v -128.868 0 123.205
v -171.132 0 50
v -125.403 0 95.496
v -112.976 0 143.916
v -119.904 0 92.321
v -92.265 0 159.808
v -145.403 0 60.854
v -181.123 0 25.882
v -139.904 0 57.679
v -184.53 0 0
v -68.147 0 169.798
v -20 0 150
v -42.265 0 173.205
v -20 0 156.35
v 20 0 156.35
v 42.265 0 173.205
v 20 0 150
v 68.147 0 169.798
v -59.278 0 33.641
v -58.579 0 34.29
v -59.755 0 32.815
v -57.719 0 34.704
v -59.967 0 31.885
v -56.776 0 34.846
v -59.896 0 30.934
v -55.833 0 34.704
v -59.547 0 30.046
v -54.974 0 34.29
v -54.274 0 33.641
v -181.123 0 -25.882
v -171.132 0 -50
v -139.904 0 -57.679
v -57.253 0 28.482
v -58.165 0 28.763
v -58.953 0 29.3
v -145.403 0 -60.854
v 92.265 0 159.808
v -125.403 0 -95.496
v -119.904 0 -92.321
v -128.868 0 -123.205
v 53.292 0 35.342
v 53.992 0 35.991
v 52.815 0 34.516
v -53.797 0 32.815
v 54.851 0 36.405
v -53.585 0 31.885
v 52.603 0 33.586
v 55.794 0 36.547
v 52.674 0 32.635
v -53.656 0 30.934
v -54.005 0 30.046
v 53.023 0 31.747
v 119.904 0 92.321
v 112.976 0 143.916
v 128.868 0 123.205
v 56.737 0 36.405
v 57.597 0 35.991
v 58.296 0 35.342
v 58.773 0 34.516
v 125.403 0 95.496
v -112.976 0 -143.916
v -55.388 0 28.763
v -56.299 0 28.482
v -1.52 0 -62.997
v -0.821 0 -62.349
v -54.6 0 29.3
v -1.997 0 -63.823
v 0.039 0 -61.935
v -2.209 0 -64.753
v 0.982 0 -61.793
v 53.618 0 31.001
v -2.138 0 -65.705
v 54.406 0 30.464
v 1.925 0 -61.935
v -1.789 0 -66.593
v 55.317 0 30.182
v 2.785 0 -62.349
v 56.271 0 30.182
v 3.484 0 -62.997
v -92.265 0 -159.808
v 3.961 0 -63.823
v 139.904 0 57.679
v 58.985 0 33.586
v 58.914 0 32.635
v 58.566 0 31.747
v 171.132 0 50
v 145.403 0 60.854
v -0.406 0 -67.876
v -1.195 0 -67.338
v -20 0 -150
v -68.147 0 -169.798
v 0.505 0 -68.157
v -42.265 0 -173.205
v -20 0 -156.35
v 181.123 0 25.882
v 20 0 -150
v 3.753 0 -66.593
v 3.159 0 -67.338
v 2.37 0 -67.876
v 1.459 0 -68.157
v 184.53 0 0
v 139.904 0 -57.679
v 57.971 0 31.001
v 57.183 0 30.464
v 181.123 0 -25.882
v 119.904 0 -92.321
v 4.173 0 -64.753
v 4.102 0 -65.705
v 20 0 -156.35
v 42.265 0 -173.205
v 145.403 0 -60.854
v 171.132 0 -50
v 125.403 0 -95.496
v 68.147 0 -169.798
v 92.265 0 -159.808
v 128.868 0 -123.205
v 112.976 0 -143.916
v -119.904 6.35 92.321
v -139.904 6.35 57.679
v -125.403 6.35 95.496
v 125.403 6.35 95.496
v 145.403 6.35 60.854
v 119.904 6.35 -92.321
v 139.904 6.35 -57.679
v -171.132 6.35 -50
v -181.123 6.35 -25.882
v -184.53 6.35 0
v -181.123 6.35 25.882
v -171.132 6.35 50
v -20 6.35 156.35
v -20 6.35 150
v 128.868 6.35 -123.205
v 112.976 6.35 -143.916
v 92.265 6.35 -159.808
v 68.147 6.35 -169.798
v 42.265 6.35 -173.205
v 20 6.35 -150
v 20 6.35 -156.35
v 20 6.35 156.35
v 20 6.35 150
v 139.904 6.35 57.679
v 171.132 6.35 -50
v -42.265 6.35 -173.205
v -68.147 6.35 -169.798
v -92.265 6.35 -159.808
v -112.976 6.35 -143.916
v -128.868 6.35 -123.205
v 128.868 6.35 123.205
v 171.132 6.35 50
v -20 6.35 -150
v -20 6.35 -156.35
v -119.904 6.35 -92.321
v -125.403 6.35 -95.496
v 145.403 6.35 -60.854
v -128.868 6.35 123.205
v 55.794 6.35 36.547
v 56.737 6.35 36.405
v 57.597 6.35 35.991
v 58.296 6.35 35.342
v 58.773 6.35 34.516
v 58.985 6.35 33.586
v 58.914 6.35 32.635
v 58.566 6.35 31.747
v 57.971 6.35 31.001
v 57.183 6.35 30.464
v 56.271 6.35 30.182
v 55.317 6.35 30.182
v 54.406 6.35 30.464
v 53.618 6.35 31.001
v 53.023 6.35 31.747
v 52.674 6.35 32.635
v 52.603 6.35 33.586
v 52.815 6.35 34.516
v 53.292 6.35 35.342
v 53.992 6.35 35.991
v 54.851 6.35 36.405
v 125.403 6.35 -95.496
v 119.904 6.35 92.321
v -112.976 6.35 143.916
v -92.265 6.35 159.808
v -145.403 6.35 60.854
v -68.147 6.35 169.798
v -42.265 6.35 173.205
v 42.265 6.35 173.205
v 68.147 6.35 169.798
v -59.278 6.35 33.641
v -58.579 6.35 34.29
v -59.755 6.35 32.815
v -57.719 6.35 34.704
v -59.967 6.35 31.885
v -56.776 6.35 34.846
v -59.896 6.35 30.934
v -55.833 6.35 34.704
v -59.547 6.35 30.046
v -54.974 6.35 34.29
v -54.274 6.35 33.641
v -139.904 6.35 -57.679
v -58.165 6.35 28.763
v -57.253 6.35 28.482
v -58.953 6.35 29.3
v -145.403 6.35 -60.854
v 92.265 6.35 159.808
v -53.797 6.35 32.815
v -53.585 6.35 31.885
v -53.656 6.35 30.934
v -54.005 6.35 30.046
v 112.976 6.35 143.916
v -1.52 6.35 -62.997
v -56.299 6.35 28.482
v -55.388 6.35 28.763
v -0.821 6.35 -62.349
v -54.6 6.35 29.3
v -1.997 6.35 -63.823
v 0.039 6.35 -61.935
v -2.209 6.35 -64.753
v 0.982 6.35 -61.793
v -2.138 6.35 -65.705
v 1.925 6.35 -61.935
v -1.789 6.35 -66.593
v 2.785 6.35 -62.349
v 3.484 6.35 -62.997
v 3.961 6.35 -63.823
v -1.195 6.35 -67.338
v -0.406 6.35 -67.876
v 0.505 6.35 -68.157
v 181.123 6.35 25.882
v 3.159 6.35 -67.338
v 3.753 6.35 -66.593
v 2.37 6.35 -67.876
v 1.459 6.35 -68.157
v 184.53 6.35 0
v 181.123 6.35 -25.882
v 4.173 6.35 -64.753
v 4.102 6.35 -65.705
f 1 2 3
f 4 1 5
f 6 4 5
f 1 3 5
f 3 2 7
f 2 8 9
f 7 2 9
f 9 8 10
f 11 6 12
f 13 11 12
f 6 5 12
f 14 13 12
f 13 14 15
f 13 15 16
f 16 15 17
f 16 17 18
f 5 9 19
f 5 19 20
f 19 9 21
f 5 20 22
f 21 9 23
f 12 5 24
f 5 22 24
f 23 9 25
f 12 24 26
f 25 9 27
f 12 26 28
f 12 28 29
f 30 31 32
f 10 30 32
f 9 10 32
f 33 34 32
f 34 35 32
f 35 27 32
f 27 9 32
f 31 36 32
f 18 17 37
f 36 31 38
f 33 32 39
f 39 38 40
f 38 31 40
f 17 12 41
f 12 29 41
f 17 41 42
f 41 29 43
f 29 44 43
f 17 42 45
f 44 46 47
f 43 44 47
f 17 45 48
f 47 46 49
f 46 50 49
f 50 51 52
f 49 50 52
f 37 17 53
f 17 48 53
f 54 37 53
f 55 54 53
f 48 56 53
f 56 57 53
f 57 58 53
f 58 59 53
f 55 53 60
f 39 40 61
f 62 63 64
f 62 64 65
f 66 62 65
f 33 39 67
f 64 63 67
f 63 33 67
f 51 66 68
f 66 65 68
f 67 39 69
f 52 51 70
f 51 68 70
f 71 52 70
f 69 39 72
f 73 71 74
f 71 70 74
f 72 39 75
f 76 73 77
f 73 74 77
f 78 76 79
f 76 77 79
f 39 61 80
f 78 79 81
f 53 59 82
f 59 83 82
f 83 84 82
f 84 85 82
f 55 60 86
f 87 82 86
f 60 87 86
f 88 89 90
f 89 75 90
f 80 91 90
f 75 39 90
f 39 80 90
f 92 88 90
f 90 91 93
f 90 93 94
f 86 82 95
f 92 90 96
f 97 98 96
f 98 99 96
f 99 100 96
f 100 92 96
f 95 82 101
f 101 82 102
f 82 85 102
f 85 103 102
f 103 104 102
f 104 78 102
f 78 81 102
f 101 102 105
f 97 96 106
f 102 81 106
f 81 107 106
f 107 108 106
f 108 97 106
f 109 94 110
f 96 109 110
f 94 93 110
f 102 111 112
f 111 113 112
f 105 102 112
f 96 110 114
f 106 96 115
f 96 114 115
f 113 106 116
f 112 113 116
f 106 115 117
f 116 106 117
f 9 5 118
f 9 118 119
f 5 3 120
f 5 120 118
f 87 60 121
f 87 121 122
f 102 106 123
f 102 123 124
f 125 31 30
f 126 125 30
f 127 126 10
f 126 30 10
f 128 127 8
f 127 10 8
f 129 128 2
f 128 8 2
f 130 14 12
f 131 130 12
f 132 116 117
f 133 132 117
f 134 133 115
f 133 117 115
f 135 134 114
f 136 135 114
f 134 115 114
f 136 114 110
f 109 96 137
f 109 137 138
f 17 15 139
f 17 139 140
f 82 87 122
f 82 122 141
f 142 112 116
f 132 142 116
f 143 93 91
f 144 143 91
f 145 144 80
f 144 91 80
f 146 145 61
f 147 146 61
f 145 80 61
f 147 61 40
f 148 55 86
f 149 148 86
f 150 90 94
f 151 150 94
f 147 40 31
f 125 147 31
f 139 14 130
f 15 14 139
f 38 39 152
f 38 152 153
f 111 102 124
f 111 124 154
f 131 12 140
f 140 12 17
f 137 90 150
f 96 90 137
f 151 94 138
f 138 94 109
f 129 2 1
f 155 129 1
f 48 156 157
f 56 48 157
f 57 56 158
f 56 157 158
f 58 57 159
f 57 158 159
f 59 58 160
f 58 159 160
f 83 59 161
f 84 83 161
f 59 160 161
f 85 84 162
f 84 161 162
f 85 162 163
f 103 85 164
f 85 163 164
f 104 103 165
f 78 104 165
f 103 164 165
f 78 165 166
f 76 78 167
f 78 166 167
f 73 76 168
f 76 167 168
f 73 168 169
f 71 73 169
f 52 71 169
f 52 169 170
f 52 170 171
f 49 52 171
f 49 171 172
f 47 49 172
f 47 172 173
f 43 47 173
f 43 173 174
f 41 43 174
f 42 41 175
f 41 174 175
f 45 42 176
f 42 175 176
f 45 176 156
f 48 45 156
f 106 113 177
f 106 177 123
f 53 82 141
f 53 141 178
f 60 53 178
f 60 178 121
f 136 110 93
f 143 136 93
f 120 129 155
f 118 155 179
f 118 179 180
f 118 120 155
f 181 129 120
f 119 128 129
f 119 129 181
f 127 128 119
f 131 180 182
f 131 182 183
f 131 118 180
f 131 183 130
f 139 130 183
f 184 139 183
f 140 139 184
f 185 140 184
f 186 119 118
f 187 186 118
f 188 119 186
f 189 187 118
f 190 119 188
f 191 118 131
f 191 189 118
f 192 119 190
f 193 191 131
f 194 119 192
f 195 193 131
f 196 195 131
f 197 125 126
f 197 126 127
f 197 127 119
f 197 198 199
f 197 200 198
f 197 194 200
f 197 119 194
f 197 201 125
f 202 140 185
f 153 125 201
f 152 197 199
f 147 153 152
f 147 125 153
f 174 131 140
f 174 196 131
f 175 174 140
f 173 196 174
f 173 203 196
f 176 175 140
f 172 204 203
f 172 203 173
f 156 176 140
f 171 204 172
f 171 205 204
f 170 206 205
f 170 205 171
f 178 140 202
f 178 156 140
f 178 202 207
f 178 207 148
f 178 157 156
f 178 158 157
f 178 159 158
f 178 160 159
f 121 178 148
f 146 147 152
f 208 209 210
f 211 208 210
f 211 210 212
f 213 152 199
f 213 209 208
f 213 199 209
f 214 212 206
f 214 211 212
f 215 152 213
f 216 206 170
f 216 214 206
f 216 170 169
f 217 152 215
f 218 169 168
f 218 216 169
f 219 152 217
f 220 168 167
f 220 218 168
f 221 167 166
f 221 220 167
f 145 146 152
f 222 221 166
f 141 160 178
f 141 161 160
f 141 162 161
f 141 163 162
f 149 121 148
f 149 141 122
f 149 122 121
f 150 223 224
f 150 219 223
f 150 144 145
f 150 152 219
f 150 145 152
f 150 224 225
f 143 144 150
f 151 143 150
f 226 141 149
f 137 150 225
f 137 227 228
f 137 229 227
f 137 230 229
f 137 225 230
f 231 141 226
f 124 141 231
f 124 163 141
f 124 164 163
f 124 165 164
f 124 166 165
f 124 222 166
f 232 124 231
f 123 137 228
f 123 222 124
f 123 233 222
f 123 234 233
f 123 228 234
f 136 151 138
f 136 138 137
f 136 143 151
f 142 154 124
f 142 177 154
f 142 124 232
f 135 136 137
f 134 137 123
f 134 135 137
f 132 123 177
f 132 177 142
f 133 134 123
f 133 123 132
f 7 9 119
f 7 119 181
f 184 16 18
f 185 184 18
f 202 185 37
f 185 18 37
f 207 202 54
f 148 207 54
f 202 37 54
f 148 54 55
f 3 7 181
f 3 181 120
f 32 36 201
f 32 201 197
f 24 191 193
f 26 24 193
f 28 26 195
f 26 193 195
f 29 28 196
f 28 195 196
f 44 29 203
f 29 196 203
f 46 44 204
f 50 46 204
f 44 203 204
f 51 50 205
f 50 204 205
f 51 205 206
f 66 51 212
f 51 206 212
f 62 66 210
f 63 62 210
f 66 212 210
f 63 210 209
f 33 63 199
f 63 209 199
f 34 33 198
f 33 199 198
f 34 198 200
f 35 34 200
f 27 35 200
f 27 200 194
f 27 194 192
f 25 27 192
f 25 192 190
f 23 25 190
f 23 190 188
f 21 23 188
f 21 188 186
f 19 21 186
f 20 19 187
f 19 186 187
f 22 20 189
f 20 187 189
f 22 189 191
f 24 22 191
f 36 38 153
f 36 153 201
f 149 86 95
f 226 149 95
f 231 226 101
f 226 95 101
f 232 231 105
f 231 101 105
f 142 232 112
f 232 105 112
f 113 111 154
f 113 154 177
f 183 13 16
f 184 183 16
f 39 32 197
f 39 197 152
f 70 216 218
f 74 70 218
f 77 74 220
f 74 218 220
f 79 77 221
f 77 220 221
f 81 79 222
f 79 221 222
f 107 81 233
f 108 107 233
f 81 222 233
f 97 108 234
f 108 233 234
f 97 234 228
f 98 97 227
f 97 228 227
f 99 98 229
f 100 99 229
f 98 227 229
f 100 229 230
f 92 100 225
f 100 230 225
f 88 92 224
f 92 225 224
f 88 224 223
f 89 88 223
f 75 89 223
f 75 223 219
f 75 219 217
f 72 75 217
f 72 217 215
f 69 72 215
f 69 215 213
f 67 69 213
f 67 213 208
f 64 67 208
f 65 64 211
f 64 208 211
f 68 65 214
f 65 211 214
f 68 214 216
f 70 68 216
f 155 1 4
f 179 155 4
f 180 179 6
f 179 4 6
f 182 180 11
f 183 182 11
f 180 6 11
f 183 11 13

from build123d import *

# Parameters (mm, degrees)
SKETCH1_W           = 40
SKETCH1_H           = 6.35
BOSS_EXTRUDE1_DEPTH = 6.35
SKETCH2_R           = 3.2
CUT_EXTRUDE1_DEPTH  = 6.35


with BuildPart() as part:
    # Sketch1 → Boss-Extrude1 (new body)
    with BuildSketch(Plane(origin=(0, 0, 0), x_dir=(1, 0, 0), z_dir=(0, 1, 0))):
        with BuildLine():
            Line((171.132486541, 50), (128.867513459, 123.205080757))
            ThreePointArc((128.867513459, 123.205080757), (92.264973081, 159.807621135), (42.264973081, 173.205080757))
            Line((42.264973081, 173.205080757), (-42.264973081, 173.205080757))
            ThreePointArc((-42.264973081, 173.205080757), (-92.264973081, 159.807621135), (-128.867513459, 123.205080757))
            Line((-128.867513459, 123.205080757), (-171.132486541, 50))
            ThreePointArc((-171.132486541, 50), (-184.529946162, 0), (-171.132486541, -50))
            Line((-171.132486541, -50), (-128.867513459, -123.205080757))
            ThreePointArc((-128.867513459, -123.205080757), (-92.264973081, -159.807621135), (-42.264973081, -173.205080757))
            Line((-42.264973081, -173.205080757), (42.264973081, -173.205080757))
            ThreePointArc((42.264973081, -173.205080757), (92.264973081, -159.807621135), (128.867513459, -123.205080757))
            Line((128.867513459, -123.205080757), (171.132486541, -50))
            ThreePointArc((171.132486541, -50), (184.529946162, 0), (171.132486541, 50))
        make_face()
        with Locations((0, -153.175)):
            Rectangle(SKETCH1_W, SKETCH1_H, mode=Mode.SUBTRACT)
        Polygon((-139.903810568, -57.679491924), (-145.403071882, -60.854491924), (-125.403071882, -95.495508076), (-119.903810568, -92.320508076), align=None, mode=Mode.SUBTRACT)
        Polygon((-119.903810568, 92.320508076), (-125.403071882, 95.495508076), (-145.403071882, 60.854491924), (-139.903810568, 57.679491924), align=None, mode=Mode.SUBTRACT)
        with Locations((0, 153.175)):
            Rectangle(SKETCH1_W, SKETCH1_H, mode=Mode.SUBTRACT)
        Polygon((139.903810568, 57.679491924), (145.403071882, 60.854491924), (125.403071882, 95.495508076), (119.903810568, 92.320508076), align=None, mode=Mode.SUBTRACT)
        Polygon((119.903810568, -92.320508076), (125.403071882, -95.495508076), (145.403071882, -60.854491924), (139.903810568, -57.679491924), align=None, mode=Mode.SUBTRACT)
    extrude(amount=BOSS_EXTRUDE1_DEPTH)

    # Sketch2 → Cut-Extrude1 (cut)
    with BuildSketch(Plane(origin=(0, 6.35, 0), x_dir=(1, 0, 0), z_dir=(0, 1, 0))):
        with Locations(Location((55.794244464, -33.346698257, 0), (0, 0, 270))):
            Circle(SKETCH2_R)
        with Locations(Location((-56.776210055, -31.645883963, 0), (0, 0, 270))):
            Circle(SKETCH2_R)
        with Locations(Location((0.981965591, 64.99258222, 0), (0, 0, 270))):
            Circle(SKETCH2_R)
    extrude(amount=-CUT_EXTRUDE1_DEPTH, mode=Mode.SUBTRACT)


solid = part.part
